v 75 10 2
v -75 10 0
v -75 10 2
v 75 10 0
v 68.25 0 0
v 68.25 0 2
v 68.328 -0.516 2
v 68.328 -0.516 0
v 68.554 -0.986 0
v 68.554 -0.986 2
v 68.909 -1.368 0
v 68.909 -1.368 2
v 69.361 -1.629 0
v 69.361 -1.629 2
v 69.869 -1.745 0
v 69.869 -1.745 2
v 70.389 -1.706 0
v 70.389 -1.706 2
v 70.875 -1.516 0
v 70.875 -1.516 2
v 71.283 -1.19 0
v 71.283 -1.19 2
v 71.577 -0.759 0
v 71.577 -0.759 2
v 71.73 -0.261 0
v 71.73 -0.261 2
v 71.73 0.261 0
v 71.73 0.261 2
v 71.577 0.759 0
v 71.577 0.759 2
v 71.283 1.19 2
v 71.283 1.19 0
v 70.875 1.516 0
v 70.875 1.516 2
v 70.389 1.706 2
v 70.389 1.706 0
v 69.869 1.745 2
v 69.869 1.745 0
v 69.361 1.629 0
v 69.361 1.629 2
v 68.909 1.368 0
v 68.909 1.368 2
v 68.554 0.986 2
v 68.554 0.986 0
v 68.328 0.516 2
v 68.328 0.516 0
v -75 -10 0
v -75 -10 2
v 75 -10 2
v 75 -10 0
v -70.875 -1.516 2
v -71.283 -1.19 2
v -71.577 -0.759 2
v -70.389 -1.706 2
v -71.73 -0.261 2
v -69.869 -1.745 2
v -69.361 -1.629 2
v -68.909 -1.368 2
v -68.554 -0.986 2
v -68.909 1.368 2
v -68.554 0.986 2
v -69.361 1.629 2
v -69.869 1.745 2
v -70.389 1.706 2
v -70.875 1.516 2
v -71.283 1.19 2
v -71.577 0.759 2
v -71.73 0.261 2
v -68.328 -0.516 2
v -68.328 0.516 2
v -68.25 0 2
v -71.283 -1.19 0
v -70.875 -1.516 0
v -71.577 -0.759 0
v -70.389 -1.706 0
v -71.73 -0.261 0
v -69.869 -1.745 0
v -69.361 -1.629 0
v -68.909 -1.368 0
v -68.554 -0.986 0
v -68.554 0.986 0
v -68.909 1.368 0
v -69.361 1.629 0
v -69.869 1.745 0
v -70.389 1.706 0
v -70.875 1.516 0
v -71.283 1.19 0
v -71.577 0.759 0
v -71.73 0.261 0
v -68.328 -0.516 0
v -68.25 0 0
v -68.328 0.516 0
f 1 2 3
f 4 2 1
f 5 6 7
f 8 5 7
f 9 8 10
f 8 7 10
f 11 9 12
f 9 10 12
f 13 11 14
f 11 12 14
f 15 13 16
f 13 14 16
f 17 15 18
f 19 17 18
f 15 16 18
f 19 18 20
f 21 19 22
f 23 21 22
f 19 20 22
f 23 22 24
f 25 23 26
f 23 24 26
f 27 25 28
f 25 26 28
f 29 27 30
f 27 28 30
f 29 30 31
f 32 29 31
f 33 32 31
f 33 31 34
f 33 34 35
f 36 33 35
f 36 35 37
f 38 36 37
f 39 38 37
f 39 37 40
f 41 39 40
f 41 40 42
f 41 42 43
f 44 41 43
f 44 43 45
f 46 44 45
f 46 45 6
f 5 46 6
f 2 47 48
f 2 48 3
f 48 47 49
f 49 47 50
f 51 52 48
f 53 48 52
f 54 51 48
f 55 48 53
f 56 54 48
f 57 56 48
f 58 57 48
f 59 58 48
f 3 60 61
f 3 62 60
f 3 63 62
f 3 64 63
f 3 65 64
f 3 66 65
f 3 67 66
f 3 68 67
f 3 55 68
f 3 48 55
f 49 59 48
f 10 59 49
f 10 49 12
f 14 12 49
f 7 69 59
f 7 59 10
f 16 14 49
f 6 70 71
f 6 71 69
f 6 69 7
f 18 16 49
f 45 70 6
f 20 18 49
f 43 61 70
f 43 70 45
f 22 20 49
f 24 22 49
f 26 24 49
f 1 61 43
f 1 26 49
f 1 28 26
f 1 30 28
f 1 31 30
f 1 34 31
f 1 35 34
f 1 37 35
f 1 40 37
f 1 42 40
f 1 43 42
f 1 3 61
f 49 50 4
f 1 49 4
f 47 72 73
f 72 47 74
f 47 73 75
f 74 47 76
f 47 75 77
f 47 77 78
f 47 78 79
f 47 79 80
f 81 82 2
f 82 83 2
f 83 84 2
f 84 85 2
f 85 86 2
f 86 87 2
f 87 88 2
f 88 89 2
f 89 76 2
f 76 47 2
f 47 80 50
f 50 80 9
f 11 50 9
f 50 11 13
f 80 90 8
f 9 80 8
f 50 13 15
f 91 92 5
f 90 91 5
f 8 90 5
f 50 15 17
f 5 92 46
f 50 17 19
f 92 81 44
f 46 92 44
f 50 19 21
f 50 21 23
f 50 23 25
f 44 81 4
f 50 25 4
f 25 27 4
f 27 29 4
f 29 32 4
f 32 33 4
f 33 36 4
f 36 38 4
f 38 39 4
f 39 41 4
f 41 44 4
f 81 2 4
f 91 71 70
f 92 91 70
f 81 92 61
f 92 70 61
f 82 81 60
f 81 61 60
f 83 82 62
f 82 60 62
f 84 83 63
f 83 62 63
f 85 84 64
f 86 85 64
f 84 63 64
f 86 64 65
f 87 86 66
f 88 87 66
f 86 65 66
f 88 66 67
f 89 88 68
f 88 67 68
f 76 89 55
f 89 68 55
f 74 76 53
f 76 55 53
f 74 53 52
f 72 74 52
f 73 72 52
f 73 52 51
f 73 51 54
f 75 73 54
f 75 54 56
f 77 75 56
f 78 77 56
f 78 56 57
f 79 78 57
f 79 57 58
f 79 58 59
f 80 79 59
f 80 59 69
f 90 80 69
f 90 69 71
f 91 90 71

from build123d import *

# Parameters (mm, degrees)
SKETCH1_W           = 150
SKETCH1_H           = 20
BOSS_EXTRUDE1_DEPTH = 2
CUT_EXTRUDE1_REACH  = 77.69
SKETCH2_R           = 1.75


with BuildPart() as part:
    # Sketch1 → Boss-Extrude1 (new body)
    with BuildSketch(Plane.XY):
        Rectangle(SKETCH1_W, SKETCH1_H)
    extrude(amount=BOSS_EXTRUDE1_DEPTH)

    # Sketch2 → Cut-Extrude1 (cut, up to next)
    with BuildSketch(Plane.XY.offset(2), mode=Mode.PRIVATE) as cut_extrude1_sk1:
        with Locations((-70, 0)):
            Circle(SKETCH2_R)
    cut_extrude1_tool1 = extrude(cut_extrude1_sk1.sketch, amount=-CUT_EXTRUDE1_REACH, mode=Mode.PRIVATE) & part.part
    # Sketch2 → Cut-Extrude1 (cut, up to next)
    with BuildSketch(Plane.XY.offset(2), mode=Mode.PRIVATE) as cut_extrude1_sk2:
        with Locations(Location((70, 0, 0), (0, 0, 180))):
            Circle(SKETCH2_R)
    cut_extrude1_tool2 = extrude(cut_extrude1_sk2.sketch, amount=-CUT_EXTRUDE1_REACH, mode=Mode.PRIVATE) & part.part
    add(cut_extrude1_tool1.solids().sort_by_distance((-70, 0, 2))[0], mode=Mode.SUBTRACT)
    add(cut_extrude1_tool2.solids().sort_by_distance((70, 0, 2))[0], mode=Mode.SUBTRACT)


solid = part.part
